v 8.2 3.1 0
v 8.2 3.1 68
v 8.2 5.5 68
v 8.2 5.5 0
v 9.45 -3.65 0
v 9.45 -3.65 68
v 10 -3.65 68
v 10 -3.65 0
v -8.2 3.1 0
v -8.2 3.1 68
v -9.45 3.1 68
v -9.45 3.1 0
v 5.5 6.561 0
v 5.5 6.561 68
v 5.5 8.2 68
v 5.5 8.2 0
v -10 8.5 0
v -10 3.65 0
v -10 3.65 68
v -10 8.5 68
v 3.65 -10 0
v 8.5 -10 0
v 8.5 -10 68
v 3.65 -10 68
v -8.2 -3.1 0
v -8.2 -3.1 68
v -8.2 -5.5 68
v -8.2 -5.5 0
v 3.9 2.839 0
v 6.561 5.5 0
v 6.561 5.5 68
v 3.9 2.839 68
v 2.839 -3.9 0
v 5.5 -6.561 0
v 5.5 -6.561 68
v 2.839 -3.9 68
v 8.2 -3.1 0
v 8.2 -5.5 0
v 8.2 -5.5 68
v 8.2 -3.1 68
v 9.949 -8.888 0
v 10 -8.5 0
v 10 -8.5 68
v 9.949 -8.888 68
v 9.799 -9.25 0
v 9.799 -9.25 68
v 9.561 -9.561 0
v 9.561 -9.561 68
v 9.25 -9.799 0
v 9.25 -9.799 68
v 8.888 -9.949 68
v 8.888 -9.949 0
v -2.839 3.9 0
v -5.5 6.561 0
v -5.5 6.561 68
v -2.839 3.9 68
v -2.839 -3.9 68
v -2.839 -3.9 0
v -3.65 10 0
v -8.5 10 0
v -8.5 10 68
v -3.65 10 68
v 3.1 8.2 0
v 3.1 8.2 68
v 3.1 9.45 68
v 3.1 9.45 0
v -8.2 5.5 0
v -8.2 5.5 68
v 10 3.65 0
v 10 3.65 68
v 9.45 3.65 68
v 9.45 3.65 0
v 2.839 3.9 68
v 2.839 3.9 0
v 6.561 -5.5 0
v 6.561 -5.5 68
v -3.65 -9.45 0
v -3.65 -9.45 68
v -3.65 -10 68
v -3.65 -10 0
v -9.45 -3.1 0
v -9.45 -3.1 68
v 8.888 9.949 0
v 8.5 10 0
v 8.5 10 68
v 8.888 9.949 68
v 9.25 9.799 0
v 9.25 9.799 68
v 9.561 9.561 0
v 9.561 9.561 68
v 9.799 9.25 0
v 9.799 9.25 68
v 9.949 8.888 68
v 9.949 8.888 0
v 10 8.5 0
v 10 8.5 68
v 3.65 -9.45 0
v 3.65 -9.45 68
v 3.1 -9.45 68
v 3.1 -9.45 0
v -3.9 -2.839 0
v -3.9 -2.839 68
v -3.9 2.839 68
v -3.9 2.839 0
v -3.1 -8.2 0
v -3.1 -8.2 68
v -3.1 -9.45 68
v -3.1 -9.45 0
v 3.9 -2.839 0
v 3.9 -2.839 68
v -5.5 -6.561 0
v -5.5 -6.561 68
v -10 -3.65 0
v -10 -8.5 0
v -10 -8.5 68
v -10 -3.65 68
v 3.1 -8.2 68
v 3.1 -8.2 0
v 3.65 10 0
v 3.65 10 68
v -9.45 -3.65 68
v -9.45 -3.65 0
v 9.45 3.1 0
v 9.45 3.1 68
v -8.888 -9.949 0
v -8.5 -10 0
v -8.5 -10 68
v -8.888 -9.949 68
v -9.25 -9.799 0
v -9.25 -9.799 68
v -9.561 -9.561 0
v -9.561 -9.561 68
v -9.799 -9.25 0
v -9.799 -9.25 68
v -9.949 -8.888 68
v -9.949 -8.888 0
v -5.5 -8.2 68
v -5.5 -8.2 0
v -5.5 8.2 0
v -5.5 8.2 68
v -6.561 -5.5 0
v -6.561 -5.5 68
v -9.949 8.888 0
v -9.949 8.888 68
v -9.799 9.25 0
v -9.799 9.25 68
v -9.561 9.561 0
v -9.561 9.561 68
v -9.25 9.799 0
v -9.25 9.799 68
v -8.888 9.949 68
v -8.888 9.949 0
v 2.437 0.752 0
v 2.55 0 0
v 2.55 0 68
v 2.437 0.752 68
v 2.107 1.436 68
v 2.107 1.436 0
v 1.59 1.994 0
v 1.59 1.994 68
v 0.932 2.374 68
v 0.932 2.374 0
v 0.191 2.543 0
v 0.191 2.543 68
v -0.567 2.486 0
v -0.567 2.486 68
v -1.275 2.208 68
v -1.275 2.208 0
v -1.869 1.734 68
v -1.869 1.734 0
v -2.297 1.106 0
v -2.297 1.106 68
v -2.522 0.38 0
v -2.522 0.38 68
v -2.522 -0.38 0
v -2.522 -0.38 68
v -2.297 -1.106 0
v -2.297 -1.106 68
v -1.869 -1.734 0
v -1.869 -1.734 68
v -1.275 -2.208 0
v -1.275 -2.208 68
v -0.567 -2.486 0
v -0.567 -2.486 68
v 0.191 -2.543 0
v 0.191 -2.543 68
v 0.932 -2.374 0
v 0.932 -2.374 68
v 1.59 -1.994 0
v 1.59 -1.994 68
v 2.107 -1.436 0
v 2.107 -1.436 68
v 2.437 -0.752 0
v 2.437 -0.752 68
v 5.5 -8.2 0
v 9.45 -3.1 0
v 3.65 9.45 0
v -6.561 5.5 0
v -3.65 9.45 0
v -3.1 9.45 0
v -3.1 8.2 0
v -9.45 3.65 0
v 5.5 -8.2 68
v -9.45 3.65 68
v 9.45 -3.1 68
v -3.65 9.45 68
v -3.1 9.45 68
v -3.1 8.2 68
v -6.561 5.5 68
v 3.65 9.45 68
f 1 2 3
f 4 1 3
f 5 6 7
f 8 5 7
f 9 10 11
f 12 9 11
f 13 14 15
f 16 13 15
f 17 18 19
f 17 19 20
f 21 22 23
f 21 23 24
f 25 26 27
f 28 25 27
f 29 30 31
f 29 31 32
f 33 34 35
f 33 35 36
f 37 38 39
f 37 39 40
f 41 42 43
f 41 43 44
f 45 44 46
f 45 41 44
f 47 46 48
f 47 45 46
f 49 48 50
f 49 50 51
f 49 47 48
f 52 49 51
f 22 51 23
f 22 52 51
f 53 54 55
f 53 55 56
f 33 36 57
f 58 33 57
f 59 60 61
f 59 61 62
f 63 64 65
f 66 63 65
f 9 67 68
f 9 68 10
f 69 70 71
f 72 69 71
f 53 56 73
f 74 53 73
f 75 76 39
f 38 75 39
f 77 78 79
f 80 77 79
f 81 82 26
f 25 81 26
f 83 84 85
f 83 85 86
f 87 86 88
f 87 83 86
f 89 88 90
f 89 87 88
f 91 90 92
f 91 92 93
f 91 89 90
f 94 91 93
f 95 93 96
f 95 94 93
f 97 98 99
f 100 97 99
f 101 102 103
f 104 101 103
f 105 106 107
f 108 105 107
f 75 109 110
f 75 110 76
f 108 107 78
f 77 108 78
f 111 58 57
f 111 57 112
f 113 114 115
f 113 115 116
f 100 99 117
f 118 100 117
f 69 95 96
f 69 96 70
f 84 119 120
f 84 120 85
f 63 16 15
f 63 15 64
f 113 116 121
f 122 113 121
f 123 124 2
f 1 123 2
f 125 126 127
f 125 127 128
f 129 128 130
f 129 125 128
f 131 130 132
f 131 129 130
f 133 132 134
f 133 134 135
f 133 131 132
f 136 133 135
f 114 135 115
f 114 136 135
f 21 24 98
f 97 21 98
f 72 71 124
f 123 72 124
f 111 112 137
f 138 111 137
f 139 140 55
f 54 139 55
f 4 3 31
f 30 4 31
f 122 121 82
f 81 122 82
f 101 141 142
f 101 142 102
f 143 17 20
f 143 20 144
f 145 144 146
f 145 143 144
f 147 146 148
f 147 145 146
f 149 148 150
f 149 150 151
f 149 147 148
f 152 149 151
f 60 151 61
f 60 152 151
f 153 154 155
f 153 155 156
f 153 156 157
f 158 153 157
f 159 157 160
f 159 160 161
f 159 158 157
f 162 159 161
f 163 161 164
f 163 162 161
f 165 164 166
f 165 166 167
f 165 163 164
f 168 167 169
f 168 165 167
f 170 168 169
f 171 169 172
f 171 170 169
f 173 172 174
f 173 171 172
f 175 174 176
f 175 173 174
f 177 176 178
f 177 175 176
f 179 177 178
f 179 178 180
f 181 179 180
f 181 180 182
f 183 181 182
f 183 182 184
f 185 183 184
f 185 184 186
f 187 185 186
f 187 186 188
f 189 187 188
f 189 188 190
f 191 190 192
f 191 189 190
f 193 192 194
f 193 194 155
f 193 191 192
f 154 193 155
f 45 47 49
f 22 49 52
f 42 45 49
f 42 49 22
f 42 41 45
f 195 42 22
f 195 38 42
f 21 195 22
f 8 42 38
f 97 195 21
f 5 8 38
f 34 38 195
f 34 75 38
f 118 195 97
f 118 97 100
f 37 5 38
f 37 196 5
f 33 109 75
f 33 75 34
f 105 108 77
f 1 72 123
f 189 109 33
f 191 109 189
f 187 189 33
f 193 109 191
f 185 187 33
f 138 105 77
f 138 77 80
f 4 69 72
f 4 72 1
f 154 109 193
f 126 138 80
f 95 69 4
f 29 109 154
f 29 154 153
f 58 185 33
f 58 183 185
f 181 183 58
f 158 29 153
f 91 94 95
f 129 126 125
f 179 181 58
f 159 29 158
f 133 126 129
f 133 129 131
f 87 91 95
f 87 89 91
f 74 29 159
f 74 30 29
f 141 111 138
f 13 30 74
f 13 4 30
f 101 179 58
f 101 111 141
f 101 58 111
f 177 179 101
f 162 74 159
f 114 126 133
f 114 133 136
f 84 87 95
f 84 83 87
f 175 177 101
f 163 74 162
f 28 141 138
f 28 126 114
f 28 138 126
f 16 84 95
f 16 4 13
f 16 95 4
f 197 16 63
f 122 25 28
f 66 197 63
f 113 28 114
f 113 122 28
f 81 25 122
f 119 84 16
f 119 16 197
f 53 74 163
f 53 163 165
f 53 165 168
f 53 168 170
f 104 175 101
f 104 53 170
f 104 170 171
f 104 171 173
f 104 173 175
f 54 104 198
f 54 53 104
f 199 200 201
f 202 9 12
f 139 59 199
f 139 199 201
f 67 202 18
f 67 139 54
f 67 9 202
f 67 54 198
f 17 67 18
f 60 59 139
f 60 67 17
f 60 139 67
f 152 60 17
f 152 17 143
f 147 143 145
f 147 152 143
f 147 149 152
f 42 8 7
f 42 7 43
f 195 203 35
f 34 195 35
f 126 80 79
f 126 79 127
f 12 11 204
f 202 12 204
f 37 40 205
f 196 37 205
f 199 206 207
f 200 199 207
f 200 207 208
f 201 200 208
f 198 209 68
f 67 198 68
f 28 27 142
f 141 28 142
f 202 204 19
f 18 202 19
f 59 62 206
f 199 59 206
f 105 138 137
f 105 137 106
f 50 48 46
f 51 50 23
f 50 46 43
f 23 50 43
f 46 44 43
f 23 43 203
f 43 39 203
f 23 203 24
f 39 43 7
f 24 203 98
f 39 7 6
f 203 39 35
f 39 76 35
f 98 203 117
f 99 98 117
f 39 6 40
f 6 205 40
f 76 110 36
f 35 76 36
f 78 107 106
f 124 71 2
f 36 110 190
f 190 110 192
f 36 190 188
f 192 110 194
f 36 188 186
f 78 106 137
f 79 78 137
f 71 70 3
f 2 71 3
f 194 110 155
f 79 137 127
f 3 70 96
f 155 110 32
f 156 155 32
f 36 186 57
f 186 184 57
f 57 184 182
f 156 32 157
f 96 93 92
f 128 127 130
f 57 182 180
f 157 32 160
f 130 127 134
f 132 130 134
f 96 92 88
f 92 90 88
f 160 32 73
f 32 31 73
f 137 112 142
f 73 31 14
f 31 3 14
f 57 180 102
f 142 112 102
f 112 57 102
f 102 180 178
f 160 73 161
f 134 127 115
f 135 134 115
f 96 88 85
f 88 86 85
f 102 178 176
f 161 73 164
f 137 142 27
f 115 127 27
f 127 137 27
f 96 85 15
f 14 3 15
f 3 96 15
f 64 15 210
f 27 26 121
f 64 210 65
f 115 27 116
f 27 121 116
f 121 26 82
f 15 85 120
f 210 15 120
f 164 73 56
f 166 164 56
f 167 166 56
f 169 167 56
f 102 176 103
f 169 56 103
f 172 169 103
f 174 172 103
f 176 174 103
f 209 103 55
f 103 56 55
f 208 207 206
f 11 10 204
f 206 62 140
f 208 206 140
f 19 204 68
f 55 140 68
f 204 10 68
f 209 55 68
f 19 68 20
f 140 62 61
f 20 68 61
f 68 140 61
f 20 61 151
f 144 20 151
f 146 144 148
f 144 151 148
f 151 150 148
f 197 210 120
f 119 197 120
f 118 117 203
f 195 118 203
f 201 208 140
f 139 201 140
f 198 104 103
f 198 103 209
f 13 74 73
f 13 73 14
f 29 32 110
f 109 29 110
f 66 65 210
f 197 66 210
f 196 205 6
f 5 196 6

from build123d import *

# Parameters (mm, degrees)
SKETCH_1_R      = 2.55
EXTRUDE_1_DEPTH = 68


with BuildPart() as part:
    # 草图1 → 凸台-拉伸1 (new body)
    with BuildSketch(Plane.XY):
        with BuildLine():
            Line((-3.9, 2.839339828), (-6.560660172, 5.5))
            Line((-6.560660172, 5.5), (-8.2, 5.5))
            Line((-8.2, 5.5), (-8.2, 3.1))
            Line((-8.2, 3.1), (-9.45, 3.1))
            Line((-9.45, 3.1), (-9.45, 3.65))
            Line((-9.45, 3.65), (-10, 3.65))
            Line((-10, 3.65), (-10, 8.5))
            ThreePointArc((-10, 8.5), (-9.560660172, 9.560660172), (-8.5, 10))
            Line((-8.5, 10), (-3.65, 10))
            Line((-3.65, 10), (-3.65, 9.45))
            Line((-3.65, 9.45), (-3.1, 9.45))
            Line((-3.1, 9.45), (-3.1, 8.2))
            Line((-3.1, 8.2), (-5.5, 8.2))
            Line((-5.5, 8.2), (-5.5, 6.560660172))
            Line((-5.5, 6.560660172), (-2.839339828, 3.9))
            Line((-2.839339828, 3.9), (2.839339828, 3.9))
            Line((2.839339828, 3.9), (5.5, 6.560660172))
            Line((5.5, 6.560660172), (5.5, 8.2))
            Line((5.5, 8.2), (3.1, 8.2))
            Line((3.1, 8.2), (3.1, 9.45))
            Line((3.1, 9.45), (3.65, 9.45))
            Line((3.65, 9.45), (3.65, 10))
            Line((3.65, 10), (8.5, 10))
            ThreePointArc((8.5, 10), (9.560660172, 9.560660172), (10, 8.5))
            Line((10, 8.5), (10, 3.65))
            Line((10, 3.65), (9.45, 3.65))
            Line((9.45, 3.65), (9.45, 3.1))
            Line((9.45, 3.1), (8.2, 3.1))
            Line((8.2, 3.1), (8.2, 5.5))
            Line((8.2, 5.5), (6.560660172, 5.5))
            Line((6.560660172, 5.5), (3.9, 2.839339828))
            Line((3.9, 2.839339828), (3.9, -2.839339828))
            Line((3.9, -2.839339828), (6.560660172, -5.5))
            Line((6.560660172, -5.5), (8.2, -5.5))
            Line((8.2, -5.5), (8.2, -3.1))
            Line((8.2, -3.1), (9.45, -3.1))
            Line((9.45, -3.1), (9.45, -3.65))
            Line((9.45, -3.65), (10, -3.65))
            Line((10, -3.65), (10, -8.5))
            ThreePointArc((10, -8.5), (9.560660172, -9.560660172), (8.5, -10))
            Line((8.5, -10), (3.65, -10))
            Line((3.65, -10), (3.65, -9.45))
            Line((3.65, -9.45), (3.1, -9.45))
            Line((3.1, -9.45), (3.1, -8.2))
            Line((3.1, -8.2), (5.5, -8.2))
            Line((5.5, -8.2), (5.5, -6.560660172))
            Line((5.5, -6.560660172), (2.839339828, -3.9))
            Line((2.839339828, -3.9), (-2.839339828, -3.9))
            Line((-2.839339828, -3.9), (-5.5, -6.560660172))
            Line((-5.5, -6.560660172), (-5.5, -8.2))
            Line((-5.5, -8.2), (-3.1, -8.2))
            Line((-3.1, -8.2), (-3.1, -9.45))
            Line((-3.1, -9.45), (-3.65, -9.45))
            Line((-3.65, -9.45), (-3.65, -10))
            Line((-3.65, -10), (-8.5, -10))
            ThreePointArc((-8.5, -10), (-9.560660172, -9.560660172), (-10, -8.5))
            Line((-10, -8.5), (-10, -3.65))
            Line((-10, -3.65), (-9.45, -3.65))
            Line((-9.45, -3.65), (-9.45, -3.1))
            Line((-9.45, -3.1), (-8.2, -3.1))
            Line((-8.2, -3.1), (-8.2, -5.5))
            Line((-8.2, -5.5), (-6.560660172, -5.5))
            Line((-6.560660172, -5.5), (-3.9, -2.839339828))
            Line((-3.9, -2.839339828), (-3.9, 2.839339828))
        make_face()
        Circle(SKETCH_1_R, mode=Mode.SUBTRACT)
    extrude(amount=EXTRUDE_1_DEPTH)


solid = part.part
